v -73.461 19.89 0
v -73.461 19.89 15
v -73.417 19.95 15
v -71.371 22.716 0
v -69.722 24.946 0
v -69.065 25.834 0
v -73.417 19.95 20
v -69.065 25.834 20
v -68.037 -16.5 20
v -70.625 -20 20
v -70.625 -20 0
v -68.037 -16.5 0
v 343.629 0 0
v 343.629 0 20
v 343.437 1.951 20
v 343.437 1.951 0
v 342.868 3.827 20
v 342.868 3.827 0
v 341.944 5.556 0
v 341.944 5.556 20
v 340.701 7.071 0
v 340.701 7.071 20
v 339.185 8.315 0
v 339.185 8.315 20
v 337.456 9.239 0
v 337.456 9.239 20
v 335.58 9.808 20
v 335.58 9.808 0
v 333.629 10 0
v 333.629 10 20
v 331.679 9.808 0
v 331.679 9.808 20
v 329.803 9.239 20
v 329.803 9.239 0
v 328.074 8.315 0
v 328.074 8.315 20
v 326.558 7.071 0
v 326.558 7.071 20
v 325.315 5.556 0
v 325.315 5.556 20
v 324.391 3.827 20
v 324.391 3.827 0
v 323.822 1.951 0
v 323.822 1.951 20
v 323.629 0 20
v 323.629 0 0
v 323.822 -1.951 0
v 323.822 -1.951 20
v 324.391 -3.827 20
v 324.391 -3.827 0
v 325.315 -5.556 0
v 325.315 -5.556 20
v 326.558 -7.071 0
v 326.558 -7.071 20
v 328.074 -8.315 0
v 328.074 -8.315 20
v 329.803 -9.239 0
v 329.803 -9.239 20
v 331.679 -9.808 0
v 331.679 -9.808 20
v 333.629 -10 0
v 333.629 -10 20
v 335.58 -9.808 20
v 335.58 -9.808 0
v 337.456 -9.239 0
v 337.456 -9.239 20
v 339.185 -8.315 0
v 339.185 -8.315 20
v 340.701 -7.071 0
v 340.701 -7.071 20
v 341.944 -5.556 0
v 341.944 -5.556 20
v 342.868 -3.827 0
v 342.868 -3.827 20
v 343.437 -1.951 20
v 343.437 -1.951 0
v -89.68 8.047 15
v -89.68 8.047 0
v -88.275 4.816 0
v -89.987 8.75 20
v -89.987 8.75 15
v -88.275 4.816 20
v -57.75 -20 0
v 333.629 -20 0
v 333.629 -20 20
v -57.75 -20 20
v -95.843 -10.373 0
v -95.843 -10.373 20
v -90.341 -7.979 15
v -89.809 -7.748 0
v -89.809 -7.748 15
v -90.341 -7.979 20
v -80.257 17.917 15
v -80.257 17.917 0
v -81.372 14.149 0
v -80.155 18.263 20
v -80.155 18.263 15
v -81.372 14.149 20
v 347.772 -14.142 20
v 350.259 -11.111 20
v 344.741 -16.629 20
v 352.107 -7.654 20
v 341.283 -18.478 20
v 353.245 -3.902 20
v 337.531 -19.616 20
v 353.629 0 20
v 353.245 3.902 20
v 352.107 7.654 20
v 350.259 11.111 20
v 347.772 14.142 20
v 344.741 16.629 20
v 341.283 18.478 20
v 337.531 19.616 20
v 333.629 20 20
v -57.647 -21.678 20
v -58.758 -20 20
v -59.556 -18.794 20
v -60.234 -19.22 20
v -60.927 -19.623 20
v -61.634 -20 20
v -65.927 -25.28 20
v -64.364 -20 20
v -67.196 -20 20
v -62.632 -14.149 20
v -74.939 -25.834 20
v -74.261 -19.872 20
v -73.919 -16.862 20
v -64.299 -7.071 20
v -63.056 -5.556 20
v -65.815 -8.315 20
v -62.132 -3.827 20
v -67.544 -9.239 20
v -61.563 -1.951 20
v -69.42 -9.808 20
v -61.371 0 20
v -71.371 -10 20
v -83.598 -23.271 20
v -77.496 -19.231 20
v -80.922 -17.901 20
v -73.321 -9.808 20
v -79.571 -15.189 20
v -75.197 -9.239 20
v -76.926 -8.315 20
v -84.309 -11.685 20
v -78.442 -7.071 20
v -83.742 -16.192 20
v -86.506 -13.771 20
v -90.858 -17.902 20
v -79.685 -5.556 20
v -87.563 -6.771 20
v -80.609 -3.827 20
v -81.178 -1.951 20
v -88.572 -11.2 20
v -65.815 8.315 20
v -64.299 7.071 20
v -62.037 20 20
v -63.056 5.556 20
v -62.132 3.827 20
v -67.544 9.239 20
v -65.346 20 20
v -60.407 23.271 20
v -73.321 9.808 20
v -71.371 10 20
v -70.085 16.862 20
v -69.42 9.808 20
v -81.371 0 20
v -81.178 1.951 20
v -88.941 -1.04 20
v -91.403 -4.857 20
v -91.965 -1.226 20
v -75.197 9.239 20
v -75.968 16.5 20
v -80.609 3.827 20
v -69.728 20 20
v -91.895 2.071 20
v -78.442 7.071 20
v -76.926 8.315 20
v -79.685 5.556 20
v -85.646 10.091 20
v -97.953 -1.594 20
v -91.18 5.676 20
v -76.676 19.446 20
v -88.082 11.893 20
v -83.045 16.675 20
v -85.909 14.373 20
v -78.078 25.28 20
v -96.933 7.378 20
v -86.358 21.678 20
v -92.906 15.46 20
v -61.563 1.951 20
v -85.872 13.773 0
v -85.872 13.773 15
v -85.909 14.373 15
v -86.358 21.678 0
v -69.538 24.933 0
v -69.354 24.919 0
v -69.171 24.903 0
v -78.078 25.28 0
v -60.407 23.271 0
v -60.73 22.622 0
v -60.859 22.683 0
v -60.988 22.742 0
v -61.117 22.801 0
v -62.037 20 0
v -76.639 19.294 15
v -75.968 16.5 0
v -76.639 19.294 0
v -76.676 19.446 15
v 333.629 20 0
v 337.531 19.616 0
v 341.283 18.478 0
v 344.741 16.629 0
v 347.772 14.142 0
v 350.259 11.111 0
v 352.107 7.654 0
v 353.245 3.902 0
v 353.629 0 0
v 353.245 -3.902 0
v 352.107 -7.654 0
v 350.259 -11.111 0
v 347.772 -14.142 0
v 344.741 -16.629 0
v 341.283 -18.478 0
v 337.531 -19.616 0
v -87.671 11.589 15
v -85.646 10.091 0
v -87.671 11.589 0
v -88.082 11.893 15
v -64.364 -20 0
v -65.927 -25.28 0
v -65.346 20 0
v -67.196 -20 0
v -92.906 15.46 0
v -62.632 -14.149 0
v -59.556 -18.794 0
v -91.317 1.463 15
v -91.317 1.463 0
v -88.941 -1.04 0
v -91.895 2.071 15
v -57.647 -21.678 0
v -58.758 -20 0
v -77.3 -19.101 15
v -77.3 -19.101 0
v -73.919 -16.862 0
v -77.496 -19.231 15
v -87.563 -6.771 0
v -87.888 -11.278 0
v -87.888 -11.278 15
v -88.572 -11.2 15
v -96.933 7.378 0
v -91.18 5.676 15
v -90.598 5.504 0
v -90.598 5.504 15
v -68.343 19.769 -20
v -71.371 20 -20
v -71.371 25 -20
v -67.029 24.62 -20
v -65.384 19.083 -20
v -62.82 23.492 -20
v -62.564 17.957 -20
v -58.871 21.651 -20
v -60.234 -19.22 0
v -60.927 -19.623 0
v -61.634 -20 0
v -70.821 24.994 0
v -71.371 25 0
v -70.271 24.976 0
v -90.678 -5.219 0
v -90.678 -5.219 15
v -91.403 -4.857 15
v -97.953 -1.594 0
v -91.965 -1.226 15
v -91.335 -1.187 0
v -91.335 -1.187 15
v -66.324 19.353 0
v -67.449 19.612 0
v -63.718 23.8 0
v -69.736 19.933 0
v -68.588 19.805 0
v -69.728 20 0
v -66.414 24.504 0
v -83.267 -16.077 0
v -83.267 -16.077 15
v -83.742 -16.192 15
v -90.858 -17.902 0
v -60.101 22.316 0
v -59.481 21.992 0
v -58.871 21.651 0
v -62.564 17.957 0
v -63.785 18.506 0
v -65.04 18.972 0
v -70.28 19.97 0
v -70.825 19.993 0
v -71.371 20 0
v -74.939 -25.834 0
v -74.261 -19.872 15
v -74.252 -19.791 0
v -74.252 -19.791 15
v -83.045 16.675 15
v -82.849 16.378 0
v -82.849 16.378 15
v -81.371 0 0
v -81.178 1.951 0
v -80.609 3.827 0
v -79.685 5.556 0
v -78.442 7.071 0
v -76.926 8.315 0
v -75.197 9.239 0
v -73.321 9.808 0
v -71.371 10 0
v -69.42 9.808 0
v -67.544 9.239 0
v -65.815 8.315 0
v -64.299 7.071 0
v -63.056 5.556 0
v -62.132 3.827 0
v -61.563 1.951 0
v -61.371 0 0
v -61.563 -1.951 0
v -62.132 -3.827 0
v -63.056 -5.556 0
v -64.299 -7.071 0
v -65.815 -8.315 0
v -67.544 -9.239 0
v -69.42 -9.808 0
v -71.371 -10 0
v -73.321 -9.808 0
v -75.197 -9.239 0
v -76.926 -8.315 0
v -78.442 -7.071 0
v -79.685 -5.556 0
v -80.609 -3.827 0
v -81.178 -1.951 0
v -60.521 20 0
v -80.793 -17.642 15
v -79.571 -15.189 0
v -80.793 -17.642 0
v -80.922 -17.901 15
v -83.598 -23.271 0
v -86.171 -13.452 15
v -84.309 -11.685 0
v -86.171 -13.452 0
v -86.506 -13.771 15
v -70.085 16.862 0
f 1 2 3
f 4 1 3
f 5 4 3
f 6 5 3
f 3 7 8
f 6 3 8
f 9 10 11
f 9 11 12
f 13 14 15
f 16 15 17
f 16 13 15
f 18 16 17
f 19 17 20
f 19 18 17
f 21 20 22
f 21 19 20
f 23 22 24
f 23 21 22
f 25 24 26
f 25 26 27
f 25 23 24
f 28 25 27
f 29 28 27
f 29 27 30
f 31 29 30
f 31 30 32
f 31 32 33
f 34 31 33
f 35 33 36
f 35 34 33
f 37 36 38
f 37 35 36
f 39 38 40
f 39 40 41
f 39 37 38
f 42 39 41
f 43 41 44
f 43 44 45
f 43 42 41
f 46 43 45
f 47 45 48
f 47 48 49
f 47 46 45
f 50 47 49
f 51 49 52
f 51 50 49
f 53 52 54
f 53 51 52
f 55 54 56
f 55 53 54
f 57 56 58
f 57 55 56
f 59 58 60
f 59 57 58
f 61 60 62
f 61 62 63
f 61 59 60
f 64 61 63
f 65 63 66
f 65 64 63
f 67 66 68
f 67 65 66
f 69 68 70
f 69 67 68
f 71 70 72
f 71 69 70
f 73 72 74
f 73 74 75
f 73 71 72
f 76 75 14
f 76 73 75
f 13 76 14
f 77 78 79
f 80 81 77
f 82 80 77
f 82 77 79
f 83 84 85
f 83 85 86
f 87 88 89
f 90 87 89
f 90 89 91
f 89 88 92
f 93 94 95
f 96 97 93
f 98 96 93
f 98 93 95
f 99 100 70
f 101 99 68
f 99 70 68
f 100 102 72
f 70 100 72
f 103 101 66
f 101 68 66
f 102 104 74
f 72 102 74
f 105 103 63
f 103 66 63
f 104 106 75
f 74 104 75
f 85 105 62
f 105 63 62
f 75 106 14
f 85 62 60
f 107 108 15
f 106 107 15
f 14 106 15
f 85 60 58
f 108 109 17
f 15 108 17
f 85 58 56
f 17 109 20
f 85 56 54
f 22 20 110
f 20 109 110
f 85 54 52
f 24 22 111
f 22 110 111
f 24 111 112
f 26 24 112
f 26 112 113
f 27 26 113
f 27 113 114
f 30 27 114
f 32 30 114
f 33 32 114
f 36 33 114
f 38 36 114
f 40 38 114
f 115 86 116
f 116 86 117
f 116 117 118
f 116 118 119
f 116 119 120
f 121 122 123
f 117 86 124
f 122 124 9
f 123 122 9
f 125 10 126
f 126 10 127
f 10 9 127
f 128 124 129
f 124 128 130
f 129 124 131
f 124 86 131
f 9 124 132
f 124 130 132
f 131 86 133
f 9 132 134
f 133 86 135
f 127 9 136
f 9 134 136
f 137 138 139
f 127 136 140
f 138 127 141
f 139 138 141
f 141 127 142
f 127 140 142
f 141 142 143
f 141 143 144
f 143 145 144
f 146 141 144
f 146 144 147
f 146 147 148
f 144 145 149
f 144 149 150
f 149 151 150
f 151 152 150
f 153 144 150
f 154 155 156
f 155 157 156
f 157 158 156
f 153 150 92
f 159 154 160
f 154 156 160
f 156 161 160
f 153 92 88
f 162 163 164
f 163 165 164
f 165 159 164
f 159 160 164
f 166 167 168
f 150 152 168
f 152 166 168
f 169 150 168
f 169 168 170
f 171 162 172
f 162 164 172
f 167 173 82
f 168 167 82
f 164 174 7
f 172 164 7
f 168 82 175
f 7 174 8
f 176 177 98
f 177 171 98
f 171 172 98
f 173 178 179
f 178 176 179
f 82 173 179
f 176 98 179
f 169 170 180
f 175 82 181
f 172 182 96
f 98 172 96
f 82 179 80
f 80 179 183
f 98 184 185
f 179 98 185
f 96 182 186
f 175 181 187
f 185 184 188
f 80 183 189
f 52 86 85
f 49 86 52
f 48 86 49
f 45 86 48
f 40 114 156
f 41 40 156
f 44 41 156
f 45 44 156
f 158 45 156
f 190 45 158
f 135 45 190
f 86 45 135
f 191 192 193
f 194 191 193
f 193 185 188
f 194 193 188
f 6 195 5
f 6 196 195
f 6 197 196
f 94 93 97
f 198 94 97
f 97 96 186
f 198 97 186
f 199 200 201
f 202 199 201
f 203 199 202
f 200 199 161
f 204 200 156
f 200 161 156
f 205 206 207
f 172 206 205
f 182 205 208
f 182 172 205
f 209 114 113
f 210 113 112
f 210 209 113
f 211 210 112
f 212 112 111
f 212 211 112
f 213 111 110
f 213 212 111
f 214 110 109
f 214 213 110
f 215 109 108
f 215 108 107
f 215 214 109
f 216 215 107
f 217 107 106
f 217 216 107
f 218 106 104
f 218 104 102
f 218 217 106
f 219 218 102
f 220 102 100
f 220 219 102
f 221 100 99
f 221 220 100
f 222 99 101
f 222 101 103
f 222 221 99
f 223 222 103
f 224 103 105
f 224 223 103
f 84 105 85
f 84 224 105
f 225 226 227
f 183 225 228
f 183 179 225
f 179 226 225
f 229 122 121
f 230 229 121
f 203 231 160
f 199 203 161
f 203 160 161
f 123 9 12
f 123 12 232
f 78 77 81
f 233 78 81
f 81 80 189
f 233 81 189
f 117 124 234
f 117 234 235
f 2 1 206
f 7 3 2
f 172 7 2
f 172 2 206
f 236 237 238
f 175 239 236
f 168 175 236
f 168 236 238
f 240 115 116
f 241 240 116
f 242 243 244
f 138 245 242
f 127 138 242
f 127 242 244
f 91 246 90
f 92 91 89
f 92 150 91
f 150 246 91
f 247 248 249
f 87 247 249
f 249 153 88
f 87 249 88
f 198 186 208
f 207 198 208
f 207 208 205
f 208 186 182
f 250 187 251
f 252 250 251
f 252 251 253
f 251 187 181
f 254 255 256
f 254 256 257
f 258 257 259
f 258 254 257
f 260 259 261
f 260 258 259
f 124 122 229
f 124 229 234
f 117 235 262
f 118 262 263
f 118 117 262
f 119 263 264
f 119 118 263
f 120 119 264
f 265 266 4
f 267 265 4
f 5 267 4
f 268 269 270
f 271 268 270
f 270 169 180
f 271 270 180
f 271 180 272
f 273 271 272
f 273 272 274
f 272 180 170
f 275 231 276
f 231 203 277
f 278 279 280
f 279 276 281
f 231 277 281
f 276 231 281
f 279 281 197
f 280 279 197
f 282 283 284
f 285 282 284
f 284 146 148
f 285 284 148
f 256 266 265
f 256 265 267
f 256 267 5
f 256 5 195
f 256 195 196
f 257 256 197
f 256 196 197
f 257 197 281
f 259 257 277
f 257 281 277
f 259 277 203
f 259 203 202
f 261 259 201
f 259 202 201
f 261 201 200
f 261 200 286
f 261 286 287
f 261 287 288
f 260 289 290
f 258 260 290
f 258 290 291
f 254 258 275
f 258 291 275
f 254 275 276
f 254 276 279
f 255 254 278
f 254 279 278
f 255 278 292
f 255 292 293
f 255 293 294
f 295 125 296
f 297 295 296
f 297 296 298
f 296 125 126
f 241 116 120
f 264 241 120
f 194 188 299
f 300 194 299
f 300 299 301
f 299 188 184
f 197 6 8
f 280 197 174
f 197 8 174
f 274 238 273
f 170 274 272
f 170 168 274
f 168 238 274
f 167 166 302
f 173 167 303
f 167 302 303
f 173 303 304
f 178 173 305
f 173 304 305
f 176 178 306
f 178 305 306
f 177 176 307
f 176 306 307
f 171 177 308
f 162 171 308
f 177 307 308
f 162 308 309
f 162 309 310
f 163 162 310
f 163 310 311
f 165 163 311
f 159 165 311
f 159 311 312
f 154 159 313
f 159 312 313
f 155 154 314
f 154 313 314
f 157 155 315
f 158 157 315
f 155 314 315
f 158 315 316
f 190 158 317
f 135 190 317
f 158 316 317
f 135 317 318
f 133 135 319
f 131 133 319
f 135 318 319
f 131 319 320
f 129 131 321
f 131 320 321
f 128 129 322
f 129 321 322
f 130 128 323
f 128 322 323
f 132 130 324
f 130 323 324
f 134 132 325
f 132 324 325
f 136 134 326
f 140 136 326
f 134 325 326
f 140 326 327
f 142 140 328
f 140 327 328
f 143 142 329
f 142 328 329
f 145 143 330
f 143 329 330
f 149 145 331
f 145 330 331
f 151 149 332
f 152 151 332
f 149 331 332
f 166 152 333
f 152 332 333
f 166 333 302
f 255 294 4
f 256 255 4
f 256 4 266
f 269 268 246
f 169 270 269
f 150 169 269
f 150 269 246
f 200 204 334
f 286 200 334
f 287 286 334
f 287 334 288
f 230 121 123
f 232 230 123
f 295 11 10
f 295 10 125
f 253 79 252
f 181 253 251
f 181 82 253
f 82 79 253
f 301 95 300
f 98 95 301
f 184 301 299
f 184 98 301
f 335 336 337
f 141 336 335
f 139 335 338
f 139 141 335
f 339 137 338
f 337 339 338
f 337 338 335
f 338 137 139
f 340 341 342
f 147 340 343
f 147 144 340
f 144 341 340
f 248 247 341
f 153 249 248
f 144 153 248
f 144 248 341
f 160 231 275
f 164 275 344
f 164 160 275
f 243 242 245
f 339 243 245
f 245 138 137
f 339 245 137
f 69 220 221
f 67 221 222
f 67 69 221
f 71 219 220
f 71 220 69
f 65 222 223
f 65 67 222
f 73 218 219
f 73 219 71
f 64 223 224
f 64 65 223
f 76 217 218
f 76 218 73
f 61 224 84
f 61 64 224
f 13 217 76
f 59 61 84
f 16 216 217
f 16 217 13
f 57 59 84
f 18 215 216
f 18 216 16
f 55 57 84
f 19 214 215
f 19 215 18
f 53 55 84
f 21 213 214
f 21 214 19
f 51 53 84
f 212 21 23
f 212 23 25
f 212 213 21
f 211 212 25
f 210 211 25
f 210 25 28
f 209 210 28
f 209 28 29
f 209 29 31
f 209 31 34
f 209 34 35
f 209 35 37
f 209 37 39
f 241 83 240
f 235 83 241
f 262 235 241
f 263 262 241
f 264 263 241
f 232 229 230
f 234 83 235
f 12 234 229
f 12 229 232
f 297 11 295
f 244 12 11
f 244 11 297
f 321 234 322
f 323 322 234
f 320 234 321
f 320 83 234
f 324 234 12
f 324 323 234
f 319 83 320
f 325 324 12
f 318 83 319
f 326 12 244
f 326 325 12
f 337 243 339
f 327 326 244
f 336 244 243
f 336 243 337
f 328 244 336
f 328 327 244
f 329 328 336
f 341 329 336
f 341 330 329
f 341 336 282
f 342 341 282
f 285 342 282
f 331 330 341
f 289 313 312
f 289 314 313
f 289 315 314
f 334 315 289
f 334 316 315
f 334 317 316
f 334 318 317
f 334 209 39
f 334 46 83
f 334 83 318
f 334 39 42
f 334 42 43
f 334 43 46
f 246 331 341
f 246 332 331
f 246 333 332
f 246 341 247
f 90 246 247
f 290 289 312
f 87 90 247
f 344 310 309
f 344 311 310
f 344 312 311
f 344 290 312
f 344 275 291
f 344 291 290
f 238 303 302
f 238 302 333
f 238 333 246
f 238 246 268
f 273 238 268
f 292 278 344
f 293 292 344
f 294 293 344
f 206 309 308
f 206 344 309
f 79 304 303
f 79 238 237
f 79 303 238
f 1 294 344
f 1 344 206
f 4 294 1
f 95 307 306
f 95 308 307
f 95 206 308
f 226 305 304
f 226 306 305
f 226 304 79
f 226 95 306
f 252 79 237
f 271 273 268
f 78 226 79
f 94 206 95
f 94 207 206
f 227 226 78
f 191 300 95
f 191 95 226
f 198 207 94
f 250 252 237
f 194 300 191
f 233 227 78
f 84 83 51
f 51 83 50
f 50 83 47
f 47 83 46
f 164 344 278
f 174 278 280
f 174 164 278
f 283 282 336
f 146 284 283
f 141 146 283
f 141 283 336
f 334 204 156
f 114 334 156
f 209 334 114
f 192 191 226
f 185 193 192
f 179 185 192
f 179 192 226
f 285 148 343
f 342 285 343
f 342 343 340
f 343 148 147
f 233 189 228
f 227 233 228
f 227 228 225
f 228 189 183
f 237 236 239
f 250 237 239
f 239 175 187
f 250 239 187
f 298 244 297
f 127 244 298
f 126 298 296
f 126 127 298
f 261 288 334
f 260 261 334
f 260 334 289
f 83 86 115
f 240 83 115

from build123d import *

# Parameters (mm, degrees)
SKETCH1_R           = 10
BOSS_EXTRUDE1_DEPTH = 20
BOSS_EXTRUDE2_START = 20
BOSS_EXTRUDE2_DEPTH = 20
SKETCH5_R           = 20
BOSS_EXTRUDE3_DEPTH = 5
CUT_EXTRUDE2_DEPTH  = 20
BOSS_EXTRUDE4_DEPTH = 20
CUT_EXTRUDE9_DEPTH  = 20
SKETCH13_R          = 10
CUT_EXTRUDE10_DEPTH = 20


with BuildPart() as part:
    # Sketch1 → Boss-Extrude1 (new body)
    with BuildSketch(Plane.XY):
        with BuildLine():
            Line((-71.370560529, 20), (333.629439471, 20))
            ThreePointArc((333.629439471, 20), (353.629439471, 0), (333.629439471, -20))
            Line((333.629439471, -20), (-71.370560529, -20))
            ThreePointArc((-71.370560529, -20), (-91.370560529, 0), (-71.370560529, 20))
        make_face()
        with Locations((-71.370560529, 0)):
            Circle(SKETCH1_R, mode=Mode.SUBTRACT)
        with Locations((333.629439471, 0)):
            Circle(SKETCH1_R, mode=Mode.SUBTRACT)
    extrude(amount=BOSS_EXTRUDE1_DEPTH)

    # Sketch2 → Boss-Extrude2 (add)
    with BuildSketch(Plane(origin=(0, 0, 0), x_dir=(-1, 0, 0), z_dir=(0, 0, -1)).offset(BOSS_EXTRUDE2_START)):
        with BuildLine():
            Line((71.370560529, -20), (71.370560529, -25))
            ThreePointArc((71.370560529, -25), (64.900084402, -24.148145657), (58.870560529, -21.650635095))
            Line((58.870560529, -21.650635095), (62.564306071, -17.956889553))
            ThreePointArc((62.564306071, -17.956889553), (66.850482602, -19.482527955), (71.370560529, -20))
        make_face()
    boss_extrude2 = extrude(amount=-BOSS_EXTRUDE2_DEPTH)

    # Sketch5 → Boss-Extrude3 (add)
    with BuildSketch(Plane.XY.offset(15)):
        with Locations((-72.002203934, 0)):
            Circle(SKETCH5_R)
    extrude(amount=BOSS_EXTRUDE3_DEPTH)

    # Mirror1: Boss-Extrude2 across plane
    add(boss_extrude2.mirror(Plane.ZX))

    # Sketch7 → Cut-Extrude2 (cut)
    with BuildSketch(Plane(origin=(0, 0, -20), x_dir=(-1, 0, 0), z_dir=(0, 0, -1))):
        with BuildLine():
            Line((62.564306071, -17.956889553), (58.870560529, -21.650635095))
            ThreePointArc((58.870560529, -21.650635095), (64.900084402, -24.148145657), (71.370560529, -25))
            Line((71.370560529, -25), (71.370560529, -20))
            ThreePointArc((71.370560529, -20), (66.850482602, -19.482527955), (62.564306071, -17.956889553))
        make_face()
    extrude(amount=-CUT_EXTRUDE2_DEPTH, mode=Mode.SUBTRACT)

    # Sketch8 → Boss-Extrude4 (add)
    with BuildSketch(Plane.XY.offset(20)):
        Polygon((-85.646323907, 10.091030395), (-86.357789766, 21.677572637), (-81.372147128, 14.149030667), (-78.077875507, 25.280154567), (-75.967816914, 16.500449024), (-69.065145589, 25.833576761), (-70.085175248, 16.861669707), (-60.406668254, 23.271088335), (-64.433755534, 15.189124172), (-53.146783654, 17.901763211), (-59.695202395, 11.684546094), (-48.161141016, 10.373221242), (-56.441055274, 6.770639312), (-46.051082422, 1.593515699), (-55.06381234, 1.040093504), (-47.07111208, -7.378391356), (-55.729589416, -4.81590293), (-51.09819936, -15.460355519), (-58.35808396, -10.091030395), (-57.646618102, -21.677572637), (-62.63226074, -14.149030667), (-65.92653236, -25.280154567), (-68.036590954, -16.500449024), (-74.939262278, -25.833576761), (-73.91923262, -16.861669707), (-83.597739613, -23.271088335), (-79.570652334, -15.189124172), (-90.857624214, -17.901763211), (-84.309205472, -11.684546094), (-95.843266852, -10.373221242), (-87.563352593, -6.770639312), (-97.953325446, -1.593515699), (-88.940595528, -1.040093504), (-96.933295787, 7.378391356), (-88.274818452, 4.81590293), (-92.906208508, 15.460355519), align=None)
    extrude(amount=-BOSS_EXTRUDE4_DEPTH)

    # Sketch10 → Cut-Extrude9 (cut)
    with BuildSketch(Plane.XY.offset(20)):
        with BuildLine():
            Line((-86.6814877, -16.89809712), (-79.570652334, -15.189124172))
            Line((-79.570652334, -15.189124172), (-81.99592579, -20.056407098))
            ThreePointArc((-81.99592579, -20.056407098), (-84.438311294, -18.625022051), (-86.6814877, -16.89809712))
        make_face()
        with BuildLine():
            Line((-84.309205472, -11.684546094), (-88.22937615, -15.406444953))
            ThreePointArc((-88.22937615, -15.406444953), (-90.031123734, -13.238238107), (-91.547408648, -10.861623847))
            Line((-91.547408648, -10.861623847), (-84.309205472, -11.684546094))
        make_face()
        with BuildLine():
            Line((-87.563352593, -6.770639312), (-92.502393068, -8.919610595))
            ThreePointArc((-92.502393068, -8.919610595), (-93.457564825, -6.272216499), (-94.074540655, -3.526239548))
            Line((-94.074540655, -3.526239548), (-87.563352593, -6.770639312))
        make_face()
        with BuildLine():
            Line((-88.940595528, -1.040093504), (-94.312976138, -1.369981861))
            ThreePointArc((-94.312976138, -1.369981861), (-94.310669326, 1.447480522), (-93.956044653, 4.24253704))
            Line((-93.956044653, 4.24253704), (-88.940595528, -1.040093504))
        make_face()
        with BuildLine():
            Line((-88.274818452, 4.81590293), (-93.447669354, 6.346815359))
            ThreePointArc((-93.447669354, 6.346815359), (-92.482976347, 9.005039035), (-91.192268127, 11.521158668))
            Line((-91.192268127, 11.521158668), (-88.274818452, 4.81590293))
        make_face()
        with BuildLine():
            Line((-85.646323907, 10.091030395), (-90.005019716, 13.314670467))
            ThreePointArc((-90.005019716, 13.314670467), (-88.18159333, 15.49770898), (-86.097159024, 17.433083507))
            Line((-86.097159024, 17.433083507), (-85.646323907, 10.091030395))
        make_face()
        with BuildLine():
            Line((-81.372147128, 14.149030667), (-84.386387194, 18.700667134))
            ThreePointArc((-84.386387194, 18.700667134), (-81.909430889, 20.140547455), (-79.269488567, 21.253773582))
            Line((-79.269488567, 21.253773582), (-81.372147128, 14.149030667))
        make_face()
        with BuildLine():
            Line((-75.967816914, 16.500449024), (-77.253980818, 21.852025701))
            ThreePointArc((-77.253980818, 21.852025701), (-74.411990383, 22.361916972), (-71.52809096, 22.503419105))
            Line((-71.52809096, 22.503419105), (-75.967816914, 16.500449024))
        make_face()
        with BuildLine():
            Line((-70.085175248, 16.861669707), (-69.458212145, 22.376268852))
            ThreePointArc((-69.458212145, 22.376268852), (-66.592631783, 21.877869576), (-63.815360138, 21.013742934))
            Line((-63.815360138, 21.013742934), (-70.085175248, 16.861669707))
        make_face()
        with BuildLine():
            Line((-62.63226074, -14.149030667), (-59.556389162, -18.793733456))
            ThreePointArc((-59.556389162, -18.793733456), (-62.072733786, -20.218474816), (-64.751115176, -21.308498365))
            Line((-64.751115176, -21.308498365), (-62.63226074, -14.149030667))
        make_face()
        with BuildLine():
            Line((-68.036590954, -16.500449024), (-66.745286272, -21.873415875))
            ThreePointArc((-66.745286272, -21.873415875), (-69.575313157, -22.347843134), (-72.442716434, -22.457987779))
            Line((-72.442716434, -22.457987779), (-68.036590954, -16.500449024))
        make_face()
        with BuildLine():
            Line((-73.91923262, -16.861669707), (-74.538256817, -22.306440369))
            ThreePointArc((-74.538256817, -22.306440369), (-77.339471693, -21.79001562), (-80.052922922, -20.923596707))
            Line((-80.052922922, -20.923596707), (-73.91923262, -16.861669707))
        make_face()
    extrude(amount=-CUT_EXTRUDE9_DEPTH, mode=Mode.SUBTRACT)

    # Sketch13 → Cut-Extrude10 (cut)
    with BuildSketch(Plane(origin=(0, 0, 0), x_dir=(-1, 0, 0), z_dir=(0, 0, -1))):
        with Locations((71.370560529, 0)):
            Circle(SKETCH13_R)
    extrude(amount=-CUT_EXTRUDE10_DEPTH, mode=Mode.SUBTRACT)


solid = part.part
